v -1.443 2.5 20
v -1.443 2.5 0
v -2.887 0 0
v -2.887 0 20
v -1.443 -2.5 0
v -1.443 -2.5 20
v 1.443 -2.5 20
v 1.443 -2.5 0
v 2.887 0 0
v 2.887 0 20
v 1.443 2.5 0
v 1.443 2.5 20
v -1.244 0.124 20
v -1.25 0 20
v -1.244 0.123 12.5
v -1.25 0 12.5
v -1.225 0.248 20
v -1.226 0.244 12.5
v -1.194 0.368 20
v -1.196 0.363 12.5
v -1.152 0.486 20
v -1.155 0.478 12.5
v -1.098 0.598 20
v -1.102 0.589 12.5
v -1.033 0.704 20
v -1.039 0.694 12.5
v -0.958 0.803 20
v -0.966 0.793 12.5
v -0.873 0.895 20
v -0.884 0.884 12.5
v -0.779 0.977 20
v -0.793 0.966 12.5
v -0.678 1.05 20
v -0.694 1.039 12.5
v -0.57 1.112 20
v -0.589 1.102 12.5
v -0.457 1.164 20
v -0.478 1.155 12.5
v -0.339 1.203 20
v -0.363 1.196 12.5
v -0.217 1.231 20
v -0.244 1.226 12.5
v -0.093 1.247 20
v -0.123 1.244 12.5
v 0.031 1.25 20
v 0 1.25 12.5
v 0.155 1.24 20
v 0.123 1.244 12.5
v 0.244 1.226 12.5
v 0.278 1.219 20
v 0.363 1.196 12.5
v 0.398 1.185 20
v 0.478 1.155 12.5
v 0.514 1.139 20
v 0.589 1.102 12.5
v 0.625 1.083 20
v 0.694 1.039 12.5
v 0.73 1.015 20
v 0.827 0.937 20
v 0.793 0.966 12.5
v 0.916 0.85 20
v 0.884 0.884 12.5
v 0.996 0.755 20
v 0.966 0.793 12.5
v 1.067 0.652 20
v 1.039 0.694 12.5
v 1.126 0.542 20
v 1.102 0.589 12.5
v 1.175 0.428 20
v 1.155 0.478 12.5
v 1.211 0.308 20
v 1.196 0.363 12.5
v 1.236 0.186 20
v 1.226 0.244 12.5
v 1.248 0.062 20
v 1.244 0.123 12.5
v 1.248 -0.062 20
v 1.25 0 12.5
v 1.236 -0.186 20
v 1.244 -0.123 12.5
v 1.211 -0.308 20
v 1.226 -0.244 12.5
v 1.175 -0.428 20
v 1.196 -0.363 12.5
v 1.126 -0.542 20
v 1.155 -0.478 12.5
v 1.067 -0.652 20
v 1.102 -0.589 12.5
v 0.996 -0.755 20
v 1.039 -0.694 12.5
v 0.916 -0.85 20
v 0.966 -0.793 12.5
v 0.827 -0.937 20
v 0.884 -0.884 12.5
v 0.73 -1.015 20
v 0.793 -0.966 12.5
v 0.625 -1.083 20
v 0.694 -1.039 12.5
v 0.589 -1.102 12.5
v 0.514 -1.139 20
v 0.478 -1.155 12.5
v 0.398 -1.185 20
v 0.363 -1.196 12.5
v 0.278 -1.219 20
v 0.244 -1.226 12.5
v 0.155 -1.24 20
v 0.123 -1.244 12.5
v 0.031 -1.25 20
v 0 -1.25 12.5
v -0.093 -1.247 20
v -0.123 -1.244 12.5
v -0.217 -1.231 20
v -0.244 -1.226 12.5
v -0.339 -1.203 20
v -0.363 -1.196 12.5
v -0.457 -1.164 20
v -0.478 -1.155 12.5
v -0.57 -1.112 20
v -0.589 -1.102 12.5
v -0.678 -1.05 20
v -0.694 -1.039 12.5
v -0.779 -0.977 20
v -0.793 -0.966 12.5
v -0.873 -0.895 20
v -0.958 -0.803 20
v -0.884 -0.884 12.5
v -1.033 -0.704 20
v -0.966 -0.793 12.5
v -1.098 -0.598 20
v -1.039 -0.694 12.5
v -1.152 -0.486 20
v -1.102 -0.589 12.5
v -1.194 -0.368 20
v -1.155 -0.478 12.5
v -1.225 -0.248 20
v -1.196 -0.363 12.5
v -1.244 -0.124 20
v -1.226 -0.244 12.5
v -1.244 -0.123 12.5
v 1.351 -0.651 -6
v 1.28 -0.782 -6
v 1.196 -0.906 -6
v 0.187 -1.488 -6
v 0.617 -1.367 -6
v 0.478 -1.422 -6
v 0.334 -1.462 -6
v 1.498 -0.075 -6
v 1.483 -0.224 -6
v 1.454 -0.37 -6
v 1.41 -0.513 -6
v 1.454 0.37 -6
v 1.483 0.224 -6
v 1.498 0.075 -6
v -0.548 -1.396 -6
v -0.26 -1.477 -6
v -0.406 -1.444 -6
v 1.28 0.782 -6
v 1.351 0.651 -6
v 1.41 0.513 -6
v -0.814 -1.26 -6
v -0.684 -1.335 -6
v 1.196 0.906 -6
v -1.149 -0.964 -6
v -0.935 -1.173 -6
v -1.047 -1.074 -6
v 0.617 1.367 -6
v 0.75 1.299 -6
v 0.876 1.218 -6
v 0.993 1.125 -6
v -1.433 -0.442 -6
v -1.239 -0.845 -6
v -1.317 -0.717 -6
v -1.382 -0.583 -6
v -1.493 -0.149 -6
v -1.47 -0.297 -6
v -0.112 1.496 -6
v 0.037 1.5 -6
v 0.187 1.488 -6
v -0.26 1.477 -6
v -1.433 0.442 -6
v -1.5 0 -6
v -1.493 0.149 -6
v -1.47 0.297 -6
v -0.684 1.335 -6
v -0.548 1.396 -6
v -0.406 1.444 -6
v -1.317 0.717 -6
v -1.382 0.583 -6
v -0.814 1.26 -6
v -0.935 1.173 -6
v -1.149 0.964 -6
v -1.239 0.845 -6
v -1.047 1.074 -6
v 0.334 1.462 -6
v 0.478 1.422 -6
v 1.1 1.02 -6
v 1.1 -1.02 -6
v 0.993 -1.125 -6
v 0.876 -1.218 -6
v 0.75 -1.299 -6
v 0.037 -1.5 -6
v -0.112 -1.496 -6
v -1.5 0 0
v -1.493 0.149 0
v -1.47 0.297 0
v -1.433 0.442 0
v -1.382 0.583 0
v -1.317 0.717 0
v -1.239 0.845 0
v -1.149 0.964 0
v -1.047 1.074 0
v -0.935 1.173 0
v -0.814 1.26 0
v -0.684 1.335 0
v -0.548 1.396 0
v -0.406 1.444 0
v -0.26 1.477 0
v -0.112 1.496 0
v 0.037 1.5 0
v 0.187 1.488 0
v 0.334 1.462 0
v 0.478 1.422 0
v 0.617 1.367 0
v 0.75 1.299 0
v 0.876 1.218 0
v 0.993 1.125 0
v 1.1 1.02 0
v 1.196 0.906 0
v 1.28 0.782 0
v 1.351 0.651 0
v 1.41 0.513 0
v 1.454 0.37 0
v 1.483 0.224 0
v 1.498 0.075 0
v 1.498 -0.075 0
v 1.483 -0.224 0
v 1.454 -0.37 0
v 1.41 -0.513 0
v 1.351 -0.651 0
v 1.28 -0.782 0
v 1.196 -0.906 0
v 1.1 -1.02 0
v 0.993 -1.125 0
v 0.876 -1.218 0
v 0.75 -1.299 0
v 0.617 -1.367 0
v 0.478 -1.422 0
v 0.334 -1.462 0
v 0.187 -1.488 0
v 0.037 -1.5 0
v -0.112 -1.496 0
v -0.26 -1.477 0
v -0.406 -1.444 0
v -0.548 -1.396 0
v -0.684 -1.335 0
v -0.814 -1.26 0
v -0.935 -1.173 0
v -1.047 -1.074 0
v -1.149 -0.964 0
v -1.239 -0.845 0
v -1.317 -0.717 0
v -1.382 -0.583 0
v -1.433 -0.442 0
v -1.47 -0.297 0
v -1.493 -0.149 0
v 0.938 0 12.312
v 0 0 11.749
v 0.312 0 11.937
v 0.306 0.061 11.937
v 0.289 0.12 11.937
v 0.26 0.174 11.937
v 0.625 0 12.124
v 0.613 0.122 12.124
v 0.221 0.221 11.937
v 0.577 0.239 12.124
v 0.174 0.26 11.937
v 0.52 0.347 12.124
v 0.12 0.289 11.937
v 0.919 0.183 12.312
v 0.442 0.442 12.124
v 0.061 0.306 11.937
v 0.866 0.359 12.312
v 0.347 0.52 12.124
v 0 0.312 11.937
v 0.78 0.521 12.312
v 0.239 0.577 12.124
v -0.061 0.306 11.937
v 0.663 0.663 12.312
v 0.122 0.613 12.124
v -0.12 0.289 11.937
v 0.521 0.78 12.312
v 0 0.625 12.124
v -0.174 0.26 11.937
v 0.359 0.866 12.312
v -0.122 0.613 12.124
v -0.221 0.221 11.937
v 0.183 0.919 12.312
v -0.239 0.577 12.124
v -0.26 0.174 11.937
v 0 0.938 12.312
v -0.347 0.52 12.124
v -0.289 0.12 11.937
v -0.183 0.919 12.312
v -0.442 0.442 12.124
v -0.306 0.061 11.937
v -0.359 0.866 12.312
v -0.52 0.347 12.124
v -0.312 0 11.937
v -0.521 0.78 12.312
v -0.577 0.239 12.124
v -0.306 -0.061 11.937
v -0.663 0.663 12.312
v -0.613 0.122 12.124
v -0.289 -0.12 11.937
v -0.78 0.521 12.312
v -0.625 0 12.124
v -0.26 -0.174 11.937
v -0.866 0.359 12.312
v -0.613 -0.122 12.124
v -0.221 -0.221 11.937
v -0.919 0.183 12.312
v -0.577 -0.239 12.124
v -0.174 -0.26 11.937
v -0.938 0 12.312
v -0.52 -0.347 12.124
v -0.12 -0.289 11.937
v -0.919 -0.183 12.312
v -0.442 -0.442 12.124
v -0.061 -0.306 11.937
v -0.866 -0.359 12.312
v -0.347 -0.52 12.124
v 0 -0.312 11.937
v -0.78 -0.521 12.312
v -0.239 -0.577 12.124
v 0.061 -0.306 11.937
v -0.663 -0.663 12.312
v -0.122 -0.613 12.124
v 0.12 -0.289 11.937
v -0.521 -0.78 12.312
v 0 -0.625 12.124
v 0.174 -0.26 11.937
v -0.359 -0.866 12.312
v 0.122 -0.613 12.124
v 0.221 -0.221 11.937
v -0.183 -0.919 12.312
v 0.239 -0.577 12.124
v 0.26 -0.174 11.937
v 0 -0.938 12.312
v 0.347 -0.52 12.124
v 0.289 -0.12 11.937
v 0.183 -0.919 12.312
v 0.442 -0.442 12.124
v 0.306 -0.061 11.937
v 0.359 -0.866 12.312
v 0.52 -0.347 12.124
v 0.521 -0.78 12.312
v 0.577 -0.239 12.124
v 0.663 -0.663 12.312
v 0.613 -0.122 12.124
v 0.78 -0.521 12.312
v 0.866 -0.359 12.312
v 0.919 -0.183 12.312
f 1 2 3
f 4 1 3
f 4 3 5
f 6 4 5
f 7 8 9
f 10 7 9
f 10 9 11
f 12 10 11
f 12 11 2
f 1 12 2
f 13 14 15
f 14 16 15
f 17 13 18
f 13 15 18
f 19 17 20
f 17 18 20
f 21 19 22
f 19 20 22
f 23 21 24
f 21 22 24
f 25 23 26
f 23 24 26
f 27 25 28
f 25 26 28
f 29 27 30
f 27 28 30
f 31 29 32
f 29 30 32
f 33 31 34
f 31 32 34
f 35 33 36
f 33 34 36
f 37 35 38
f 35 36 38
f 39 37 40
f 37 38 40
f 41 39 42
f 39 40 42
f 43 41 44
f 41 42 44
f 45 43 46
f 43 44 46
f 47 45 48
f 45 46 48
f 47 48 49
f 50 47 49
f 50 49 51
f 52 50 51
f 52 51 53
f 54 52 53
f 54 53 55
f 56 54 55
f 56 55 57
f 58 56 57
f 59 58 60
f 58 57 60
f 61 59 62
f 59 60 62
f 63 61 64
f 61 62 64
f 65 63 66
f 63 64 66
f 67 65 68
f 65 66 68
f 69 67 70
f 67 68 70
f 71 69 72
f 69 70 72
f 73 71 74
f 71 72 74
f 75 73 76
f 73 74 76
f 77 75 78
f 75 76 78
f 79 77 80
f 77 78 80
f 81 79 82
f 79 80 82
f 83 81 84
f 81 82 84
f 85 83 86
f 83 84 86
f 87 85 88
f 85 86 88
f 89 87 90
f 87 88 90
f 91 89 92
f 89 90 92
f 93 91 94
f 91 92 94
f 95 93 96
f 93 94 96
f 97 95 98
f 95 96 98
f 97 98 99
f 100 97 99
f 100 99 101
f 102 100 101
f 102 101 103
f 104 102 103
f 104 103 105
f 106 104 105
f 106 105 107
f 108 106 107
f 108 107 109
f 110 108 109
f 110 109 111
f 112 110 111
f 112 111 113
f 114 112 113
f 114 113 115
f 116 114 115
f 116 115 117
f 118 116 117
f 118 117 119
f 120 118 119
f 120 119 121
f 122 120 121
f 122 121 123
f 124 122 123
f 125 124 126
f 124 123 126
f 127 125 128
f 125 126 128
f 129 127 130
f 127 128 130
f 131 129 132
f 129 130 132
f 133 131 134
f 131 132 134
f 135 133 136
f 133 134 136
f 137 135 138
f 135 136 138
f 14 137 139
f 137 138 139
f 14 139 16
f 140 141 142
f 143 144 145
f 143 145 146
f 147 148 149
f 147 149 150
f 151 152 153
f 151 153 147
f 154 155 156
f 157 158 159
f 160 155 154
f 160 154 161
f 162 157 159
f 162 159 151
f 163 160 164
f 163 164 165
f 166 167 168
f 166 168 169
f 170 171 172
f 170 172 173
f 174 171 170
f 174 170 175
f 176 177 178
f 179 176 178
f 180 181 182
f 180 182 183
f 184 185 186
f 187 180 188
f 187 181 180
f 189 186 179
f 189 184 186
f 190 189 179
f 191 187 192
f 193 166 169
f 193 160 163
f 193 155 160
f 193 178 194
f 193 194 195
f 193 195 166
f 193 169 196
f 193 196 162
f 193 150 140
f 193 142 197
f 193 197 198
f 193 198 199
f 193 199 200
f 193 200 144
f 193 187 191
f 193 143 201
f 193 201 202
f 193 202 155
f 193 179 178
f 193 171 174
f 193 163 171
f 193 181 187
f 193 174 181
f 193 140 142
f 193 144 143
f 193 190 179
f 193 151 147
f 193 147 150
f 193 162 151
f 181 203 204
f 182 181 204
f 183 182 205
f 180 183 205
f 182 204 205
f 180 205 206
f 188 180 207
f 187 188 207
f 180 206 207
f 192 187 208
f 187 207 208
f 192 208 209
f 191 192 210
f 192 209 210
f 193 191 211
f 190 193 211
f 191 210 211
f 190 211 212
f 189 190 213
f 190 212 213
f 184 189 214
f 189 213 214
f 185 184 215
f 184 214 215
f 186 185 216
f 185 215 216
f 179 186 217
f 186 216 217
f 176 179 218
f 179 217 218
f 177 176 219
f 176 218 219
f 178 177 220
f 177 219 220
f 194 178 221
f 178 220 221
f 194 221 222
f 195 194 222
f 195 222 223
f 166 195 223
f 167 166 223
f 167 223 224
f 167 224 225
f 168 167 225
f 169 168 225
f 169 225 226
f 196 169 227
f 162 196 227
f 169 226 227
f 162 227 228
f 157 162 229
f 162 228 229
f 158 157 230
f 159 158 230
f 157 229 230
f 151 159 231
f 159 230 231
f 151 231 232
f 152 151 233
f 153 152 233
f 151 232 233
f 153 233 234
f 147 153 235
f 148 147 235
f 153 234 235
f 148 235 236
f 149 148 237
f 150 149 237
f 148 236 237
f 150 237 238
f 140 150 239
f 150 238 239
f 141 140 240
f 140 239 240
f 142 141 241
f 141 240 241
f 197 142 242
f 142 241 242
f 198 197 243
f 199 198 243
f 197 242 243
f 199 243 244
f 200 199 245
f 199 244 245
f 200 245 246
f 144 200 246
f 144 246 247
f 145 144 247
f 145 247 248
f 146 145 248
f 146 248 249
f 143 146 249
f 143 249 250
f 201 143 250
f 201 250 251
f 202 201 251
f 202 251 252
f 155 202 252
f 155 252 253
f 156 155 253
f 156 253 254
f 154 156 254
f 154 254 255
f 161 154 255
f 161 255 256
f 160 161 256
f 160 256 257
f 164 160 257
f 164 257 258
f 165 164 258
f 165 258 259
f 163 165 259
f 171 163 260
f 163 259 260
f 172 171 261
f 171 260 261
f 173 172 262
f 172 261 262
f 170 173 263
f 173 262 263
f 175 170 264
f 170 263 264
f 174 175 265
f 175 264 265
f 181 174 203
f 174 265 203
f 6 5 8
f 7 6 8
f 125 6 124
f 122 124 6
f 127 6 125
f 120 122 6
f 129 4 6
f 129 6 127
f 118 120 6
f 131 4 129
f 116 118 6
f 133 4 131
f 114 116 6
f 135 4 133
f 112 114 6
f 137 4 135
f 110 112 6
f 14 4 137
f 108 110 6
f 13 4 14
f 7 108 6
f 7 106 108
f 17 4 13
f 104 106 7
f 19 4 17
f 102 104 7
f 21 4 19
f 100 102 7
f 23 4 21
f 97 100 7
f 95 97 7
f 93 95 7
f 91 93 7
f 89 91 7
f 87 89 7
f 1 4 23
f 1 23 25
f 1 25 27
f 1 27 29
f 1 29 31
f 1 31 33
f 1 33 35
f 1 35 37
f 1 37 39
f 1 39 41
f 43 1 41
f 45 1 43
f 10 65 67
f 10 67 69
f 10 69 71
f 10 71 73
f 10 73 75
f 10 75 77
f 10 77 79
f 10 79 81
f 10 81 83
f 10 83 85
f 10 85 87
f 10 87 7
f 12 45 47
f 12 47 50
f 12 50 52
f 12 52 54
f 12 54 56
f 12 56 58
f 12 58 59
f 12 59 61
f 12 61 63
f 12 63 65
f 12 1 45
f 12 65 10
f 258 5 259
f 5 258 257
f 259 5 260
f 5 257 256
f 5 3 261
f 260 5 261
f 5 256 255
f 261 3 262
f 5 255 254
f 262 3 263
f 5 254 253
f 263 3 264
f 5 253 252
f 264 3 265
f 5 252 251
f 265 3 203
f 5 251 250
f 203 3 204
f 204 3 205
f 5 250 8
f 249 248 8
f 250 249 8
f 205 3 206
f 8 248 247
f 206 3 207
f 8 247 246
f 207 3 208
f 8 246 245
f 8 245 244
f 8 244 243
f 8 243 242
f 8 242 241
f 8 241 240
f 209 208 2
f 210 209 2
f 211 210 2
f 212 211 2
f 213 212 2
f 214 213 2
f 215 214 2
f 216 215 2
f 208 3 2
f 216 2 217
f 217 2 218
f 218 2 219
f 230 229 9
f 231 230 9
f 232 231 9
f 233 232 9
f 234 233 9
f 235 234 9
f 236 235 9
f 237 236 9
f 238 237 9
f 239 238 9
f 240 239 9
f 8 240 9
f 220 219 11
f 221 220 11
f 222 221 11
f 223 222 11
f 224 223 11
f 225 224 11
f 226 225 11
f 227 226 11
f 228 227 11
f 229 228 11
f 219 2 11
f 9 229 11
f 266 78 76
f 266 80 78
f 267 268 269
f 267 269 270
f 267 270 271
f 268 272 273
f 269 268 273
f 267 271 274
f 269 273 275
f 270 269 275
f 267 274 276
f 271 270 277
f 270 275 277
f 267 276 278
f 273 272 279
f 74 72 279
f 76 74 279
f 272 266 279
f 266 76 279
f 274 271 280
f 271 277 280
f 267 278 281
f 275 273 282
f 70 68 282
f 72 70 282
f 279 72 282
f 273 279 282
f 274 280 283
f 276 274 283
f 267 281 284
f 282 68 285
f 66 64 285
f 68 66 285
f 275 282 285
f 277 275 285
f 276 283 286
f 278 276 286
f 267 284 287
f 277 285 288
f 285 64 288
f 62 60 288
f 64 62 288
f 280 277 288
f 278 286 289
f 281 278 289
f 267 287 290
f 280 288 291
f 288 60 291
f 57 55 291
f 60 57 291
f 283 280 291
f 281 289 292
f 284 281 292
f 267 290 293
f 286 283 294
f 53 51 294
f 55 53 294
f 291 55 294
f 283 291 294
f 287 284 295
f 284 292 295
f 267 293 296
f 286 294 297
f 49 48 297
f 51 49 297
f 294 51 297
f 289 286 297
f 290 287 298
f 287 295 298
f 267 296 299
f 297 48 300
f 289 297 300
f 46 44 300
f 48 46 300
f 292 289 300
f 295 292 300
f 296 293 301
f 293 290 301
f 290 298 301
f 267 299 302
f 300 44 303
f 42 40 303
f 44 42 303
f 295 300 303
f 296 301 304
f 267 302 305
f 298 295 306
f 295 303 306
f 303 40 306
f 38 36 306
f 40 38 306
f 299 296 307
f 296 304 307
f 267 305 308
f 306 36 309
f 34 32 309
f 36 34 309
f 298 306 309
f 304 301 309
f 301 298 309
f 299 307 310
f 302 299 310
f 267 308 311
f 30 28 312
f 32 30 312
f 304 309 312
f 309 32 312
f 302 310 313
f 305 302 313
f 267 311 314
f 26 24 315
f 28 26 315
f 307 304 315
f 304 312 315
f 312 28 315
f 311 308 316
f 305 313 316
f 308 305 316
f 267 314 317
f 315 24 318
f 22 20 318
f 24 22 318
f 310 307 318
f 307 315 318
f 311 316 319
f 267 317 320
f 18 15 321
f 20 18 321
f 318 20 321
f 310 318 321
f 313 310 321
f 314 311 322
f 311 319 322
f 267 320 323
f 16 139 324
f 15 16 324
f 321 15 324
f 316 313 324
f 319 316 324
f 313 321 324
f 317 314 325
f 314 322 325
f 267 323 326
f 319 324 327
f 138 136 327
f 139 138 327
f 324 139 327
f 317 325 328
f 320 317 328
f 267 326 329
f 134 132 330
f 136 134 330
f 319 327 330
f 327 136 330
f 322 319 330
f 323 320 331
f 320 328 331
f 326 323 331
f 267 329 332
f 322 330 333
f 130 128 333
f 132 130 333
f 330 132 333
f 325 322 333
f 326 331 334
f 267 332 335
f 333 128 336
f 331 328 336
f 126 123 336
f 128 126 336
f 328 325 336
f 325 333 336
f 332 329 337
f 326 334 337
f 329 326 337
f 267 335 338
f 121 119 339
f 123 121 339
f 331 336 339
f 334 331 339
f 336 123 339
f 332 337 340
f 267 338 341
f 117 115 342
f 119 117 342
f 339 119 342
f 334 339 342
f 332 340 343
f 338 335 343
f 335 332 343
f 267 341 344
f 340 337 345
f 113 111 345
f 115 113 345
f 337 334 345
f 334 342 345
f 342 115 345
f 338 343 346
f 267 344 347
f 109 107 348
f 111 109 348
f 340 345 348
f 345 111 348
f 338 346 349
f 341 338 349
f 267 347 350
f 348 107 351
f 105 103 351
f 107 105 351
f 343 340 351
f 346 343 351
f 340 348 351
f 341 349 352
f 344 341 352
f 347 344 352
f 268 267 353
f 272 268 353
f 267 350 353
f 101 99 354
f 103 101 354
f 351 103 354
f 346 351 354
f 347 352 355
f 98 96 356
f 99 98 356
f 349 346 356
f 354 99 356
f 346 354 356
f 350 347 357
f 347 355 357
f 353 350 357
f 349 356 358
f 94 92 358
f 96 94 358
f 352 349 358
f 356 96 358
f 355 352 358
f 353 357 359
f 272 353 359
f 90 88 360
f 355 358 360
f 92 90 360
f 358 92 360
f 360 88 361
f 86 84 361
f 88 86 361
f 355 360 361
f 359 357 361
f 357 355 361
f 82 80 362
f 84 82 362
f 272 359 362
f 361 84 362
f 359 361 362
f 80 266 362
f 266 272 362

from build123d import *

# Parameters (mm, degrees)
EXTRUDE_1_DEPTH = 20
SKETCH_4_R      = 1.5
EXTRUDE_2_DEPTH = 6
M3X0_5_1_D      = 2.5
M3X0_5_1_DEPTH  = 7.5
M3X0_5_1_TIP    = 0.751075774


with BuildPart() as part:
    # 草圖1 → 填料-伸長1 (new body)
    with BuildSketch(Plane.XY):
        Polygon((-1.443375673, 2.5), (-2.886751346, 0), (-1.443375673, -2.5), (1.443375673, -2.5), (2.886751346, 0), (1.443375673, 2.5), align=None)
    extrude(amount=EXTRUDE_1_DEPTH)

    # 草圖4 → 填料-伸長2 (add)
    with BuildSketch(Plane(origin=(0, 0, 0), x_dir=(-1, 0, 0), z_dir=(0, 0, -1))):
        Circle(SKETCH_4_R)
    extrude(amount=EXTRUDE_2_DEPTH)

    # M3x0.5 螺紋孔1
    with Locations(Plane.XY.offset(20)):
        with Locations((0, 0)):
            Hole(M3X0_5_1_D / 2, depth=M3X0_5_1_DEPTH)
            with Locations((0, 0, -(M3X0_5_1_DEPTH + M3X0_5_1_TIP / 2))):  # 118° drill point
                Cone(0, M3X0_5_1_D / 2, M3X0_5_1_TIP, mode=Mode.SUBTRACT)


solid = part.part
